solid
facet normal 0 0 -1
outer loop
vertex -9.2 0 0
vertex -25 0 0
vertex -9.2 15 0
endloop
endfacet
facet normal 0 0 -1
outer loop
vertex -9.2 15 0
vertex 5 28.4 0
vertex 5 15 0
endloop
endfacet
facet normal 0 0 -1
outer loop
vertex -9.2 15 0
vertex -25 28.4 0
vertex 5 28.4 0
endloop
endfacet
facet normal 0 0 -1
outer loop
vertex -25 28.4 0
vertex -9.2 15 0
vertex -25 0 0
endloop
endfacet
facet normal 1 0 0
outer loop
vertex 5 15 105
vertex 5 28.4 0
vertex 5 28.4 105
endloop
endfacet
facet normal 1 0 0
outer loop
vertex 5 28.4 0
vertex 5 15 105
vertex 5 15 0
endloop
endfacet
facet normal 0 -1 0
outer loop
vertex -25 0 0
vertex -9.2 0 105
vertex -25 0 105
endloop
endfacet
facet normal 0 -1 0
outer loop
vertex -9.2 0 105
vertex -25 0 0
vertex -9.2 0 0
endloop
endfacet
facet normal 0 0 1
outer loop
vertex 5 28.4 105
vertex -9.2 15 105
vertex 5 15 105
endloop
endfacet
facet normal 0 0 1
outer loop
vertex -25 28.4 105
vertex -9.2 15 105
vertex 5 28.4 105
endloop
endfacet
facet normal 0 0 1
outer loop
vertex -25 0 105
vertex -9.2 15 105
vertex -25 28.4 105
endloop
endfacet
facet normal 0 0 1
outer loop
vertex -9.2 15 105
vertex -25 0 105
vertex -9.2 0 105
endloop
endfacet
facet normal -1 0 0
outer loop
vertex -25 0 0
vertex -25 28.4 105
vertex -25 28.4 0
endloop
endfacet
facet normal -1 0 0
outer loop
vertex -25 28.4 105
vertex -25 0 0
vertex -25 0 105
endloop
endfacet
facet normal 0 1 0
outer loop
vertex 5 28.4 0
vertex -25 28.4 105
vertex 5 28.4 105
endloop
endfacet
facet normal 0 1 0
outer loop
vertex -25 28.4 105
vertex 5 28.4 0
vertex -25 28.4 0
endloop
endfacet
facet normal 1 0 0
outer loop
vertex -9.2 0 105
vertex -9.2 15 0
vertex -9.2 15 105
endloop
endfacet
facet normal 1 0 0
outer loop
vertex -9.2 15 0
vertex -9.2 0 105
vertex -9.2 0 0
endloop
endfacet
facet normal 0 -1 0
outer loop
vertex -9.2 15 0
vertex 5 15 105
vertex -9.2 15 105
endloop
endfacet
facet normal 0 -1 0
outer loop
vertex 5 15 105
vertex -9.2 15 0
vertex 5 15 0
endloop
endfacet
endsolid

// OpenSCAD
// Built by bench/smallmodels/features/compiler.py from a list of features.
$fn = 64;
difference() {
  union() {
    translate([0, 0, 0]) linear_extrude(height = 105) polygon([[0, 0], [5, 0], [5, 28.4], [-25, 28.4], [-25, 0]]);
  }
  union() {
    translate([0, 0, 0]) rotate([0, 0, 0]) translate([-9.2, -15, 0]) cube([18.4, 30, 105]);
  }
}
